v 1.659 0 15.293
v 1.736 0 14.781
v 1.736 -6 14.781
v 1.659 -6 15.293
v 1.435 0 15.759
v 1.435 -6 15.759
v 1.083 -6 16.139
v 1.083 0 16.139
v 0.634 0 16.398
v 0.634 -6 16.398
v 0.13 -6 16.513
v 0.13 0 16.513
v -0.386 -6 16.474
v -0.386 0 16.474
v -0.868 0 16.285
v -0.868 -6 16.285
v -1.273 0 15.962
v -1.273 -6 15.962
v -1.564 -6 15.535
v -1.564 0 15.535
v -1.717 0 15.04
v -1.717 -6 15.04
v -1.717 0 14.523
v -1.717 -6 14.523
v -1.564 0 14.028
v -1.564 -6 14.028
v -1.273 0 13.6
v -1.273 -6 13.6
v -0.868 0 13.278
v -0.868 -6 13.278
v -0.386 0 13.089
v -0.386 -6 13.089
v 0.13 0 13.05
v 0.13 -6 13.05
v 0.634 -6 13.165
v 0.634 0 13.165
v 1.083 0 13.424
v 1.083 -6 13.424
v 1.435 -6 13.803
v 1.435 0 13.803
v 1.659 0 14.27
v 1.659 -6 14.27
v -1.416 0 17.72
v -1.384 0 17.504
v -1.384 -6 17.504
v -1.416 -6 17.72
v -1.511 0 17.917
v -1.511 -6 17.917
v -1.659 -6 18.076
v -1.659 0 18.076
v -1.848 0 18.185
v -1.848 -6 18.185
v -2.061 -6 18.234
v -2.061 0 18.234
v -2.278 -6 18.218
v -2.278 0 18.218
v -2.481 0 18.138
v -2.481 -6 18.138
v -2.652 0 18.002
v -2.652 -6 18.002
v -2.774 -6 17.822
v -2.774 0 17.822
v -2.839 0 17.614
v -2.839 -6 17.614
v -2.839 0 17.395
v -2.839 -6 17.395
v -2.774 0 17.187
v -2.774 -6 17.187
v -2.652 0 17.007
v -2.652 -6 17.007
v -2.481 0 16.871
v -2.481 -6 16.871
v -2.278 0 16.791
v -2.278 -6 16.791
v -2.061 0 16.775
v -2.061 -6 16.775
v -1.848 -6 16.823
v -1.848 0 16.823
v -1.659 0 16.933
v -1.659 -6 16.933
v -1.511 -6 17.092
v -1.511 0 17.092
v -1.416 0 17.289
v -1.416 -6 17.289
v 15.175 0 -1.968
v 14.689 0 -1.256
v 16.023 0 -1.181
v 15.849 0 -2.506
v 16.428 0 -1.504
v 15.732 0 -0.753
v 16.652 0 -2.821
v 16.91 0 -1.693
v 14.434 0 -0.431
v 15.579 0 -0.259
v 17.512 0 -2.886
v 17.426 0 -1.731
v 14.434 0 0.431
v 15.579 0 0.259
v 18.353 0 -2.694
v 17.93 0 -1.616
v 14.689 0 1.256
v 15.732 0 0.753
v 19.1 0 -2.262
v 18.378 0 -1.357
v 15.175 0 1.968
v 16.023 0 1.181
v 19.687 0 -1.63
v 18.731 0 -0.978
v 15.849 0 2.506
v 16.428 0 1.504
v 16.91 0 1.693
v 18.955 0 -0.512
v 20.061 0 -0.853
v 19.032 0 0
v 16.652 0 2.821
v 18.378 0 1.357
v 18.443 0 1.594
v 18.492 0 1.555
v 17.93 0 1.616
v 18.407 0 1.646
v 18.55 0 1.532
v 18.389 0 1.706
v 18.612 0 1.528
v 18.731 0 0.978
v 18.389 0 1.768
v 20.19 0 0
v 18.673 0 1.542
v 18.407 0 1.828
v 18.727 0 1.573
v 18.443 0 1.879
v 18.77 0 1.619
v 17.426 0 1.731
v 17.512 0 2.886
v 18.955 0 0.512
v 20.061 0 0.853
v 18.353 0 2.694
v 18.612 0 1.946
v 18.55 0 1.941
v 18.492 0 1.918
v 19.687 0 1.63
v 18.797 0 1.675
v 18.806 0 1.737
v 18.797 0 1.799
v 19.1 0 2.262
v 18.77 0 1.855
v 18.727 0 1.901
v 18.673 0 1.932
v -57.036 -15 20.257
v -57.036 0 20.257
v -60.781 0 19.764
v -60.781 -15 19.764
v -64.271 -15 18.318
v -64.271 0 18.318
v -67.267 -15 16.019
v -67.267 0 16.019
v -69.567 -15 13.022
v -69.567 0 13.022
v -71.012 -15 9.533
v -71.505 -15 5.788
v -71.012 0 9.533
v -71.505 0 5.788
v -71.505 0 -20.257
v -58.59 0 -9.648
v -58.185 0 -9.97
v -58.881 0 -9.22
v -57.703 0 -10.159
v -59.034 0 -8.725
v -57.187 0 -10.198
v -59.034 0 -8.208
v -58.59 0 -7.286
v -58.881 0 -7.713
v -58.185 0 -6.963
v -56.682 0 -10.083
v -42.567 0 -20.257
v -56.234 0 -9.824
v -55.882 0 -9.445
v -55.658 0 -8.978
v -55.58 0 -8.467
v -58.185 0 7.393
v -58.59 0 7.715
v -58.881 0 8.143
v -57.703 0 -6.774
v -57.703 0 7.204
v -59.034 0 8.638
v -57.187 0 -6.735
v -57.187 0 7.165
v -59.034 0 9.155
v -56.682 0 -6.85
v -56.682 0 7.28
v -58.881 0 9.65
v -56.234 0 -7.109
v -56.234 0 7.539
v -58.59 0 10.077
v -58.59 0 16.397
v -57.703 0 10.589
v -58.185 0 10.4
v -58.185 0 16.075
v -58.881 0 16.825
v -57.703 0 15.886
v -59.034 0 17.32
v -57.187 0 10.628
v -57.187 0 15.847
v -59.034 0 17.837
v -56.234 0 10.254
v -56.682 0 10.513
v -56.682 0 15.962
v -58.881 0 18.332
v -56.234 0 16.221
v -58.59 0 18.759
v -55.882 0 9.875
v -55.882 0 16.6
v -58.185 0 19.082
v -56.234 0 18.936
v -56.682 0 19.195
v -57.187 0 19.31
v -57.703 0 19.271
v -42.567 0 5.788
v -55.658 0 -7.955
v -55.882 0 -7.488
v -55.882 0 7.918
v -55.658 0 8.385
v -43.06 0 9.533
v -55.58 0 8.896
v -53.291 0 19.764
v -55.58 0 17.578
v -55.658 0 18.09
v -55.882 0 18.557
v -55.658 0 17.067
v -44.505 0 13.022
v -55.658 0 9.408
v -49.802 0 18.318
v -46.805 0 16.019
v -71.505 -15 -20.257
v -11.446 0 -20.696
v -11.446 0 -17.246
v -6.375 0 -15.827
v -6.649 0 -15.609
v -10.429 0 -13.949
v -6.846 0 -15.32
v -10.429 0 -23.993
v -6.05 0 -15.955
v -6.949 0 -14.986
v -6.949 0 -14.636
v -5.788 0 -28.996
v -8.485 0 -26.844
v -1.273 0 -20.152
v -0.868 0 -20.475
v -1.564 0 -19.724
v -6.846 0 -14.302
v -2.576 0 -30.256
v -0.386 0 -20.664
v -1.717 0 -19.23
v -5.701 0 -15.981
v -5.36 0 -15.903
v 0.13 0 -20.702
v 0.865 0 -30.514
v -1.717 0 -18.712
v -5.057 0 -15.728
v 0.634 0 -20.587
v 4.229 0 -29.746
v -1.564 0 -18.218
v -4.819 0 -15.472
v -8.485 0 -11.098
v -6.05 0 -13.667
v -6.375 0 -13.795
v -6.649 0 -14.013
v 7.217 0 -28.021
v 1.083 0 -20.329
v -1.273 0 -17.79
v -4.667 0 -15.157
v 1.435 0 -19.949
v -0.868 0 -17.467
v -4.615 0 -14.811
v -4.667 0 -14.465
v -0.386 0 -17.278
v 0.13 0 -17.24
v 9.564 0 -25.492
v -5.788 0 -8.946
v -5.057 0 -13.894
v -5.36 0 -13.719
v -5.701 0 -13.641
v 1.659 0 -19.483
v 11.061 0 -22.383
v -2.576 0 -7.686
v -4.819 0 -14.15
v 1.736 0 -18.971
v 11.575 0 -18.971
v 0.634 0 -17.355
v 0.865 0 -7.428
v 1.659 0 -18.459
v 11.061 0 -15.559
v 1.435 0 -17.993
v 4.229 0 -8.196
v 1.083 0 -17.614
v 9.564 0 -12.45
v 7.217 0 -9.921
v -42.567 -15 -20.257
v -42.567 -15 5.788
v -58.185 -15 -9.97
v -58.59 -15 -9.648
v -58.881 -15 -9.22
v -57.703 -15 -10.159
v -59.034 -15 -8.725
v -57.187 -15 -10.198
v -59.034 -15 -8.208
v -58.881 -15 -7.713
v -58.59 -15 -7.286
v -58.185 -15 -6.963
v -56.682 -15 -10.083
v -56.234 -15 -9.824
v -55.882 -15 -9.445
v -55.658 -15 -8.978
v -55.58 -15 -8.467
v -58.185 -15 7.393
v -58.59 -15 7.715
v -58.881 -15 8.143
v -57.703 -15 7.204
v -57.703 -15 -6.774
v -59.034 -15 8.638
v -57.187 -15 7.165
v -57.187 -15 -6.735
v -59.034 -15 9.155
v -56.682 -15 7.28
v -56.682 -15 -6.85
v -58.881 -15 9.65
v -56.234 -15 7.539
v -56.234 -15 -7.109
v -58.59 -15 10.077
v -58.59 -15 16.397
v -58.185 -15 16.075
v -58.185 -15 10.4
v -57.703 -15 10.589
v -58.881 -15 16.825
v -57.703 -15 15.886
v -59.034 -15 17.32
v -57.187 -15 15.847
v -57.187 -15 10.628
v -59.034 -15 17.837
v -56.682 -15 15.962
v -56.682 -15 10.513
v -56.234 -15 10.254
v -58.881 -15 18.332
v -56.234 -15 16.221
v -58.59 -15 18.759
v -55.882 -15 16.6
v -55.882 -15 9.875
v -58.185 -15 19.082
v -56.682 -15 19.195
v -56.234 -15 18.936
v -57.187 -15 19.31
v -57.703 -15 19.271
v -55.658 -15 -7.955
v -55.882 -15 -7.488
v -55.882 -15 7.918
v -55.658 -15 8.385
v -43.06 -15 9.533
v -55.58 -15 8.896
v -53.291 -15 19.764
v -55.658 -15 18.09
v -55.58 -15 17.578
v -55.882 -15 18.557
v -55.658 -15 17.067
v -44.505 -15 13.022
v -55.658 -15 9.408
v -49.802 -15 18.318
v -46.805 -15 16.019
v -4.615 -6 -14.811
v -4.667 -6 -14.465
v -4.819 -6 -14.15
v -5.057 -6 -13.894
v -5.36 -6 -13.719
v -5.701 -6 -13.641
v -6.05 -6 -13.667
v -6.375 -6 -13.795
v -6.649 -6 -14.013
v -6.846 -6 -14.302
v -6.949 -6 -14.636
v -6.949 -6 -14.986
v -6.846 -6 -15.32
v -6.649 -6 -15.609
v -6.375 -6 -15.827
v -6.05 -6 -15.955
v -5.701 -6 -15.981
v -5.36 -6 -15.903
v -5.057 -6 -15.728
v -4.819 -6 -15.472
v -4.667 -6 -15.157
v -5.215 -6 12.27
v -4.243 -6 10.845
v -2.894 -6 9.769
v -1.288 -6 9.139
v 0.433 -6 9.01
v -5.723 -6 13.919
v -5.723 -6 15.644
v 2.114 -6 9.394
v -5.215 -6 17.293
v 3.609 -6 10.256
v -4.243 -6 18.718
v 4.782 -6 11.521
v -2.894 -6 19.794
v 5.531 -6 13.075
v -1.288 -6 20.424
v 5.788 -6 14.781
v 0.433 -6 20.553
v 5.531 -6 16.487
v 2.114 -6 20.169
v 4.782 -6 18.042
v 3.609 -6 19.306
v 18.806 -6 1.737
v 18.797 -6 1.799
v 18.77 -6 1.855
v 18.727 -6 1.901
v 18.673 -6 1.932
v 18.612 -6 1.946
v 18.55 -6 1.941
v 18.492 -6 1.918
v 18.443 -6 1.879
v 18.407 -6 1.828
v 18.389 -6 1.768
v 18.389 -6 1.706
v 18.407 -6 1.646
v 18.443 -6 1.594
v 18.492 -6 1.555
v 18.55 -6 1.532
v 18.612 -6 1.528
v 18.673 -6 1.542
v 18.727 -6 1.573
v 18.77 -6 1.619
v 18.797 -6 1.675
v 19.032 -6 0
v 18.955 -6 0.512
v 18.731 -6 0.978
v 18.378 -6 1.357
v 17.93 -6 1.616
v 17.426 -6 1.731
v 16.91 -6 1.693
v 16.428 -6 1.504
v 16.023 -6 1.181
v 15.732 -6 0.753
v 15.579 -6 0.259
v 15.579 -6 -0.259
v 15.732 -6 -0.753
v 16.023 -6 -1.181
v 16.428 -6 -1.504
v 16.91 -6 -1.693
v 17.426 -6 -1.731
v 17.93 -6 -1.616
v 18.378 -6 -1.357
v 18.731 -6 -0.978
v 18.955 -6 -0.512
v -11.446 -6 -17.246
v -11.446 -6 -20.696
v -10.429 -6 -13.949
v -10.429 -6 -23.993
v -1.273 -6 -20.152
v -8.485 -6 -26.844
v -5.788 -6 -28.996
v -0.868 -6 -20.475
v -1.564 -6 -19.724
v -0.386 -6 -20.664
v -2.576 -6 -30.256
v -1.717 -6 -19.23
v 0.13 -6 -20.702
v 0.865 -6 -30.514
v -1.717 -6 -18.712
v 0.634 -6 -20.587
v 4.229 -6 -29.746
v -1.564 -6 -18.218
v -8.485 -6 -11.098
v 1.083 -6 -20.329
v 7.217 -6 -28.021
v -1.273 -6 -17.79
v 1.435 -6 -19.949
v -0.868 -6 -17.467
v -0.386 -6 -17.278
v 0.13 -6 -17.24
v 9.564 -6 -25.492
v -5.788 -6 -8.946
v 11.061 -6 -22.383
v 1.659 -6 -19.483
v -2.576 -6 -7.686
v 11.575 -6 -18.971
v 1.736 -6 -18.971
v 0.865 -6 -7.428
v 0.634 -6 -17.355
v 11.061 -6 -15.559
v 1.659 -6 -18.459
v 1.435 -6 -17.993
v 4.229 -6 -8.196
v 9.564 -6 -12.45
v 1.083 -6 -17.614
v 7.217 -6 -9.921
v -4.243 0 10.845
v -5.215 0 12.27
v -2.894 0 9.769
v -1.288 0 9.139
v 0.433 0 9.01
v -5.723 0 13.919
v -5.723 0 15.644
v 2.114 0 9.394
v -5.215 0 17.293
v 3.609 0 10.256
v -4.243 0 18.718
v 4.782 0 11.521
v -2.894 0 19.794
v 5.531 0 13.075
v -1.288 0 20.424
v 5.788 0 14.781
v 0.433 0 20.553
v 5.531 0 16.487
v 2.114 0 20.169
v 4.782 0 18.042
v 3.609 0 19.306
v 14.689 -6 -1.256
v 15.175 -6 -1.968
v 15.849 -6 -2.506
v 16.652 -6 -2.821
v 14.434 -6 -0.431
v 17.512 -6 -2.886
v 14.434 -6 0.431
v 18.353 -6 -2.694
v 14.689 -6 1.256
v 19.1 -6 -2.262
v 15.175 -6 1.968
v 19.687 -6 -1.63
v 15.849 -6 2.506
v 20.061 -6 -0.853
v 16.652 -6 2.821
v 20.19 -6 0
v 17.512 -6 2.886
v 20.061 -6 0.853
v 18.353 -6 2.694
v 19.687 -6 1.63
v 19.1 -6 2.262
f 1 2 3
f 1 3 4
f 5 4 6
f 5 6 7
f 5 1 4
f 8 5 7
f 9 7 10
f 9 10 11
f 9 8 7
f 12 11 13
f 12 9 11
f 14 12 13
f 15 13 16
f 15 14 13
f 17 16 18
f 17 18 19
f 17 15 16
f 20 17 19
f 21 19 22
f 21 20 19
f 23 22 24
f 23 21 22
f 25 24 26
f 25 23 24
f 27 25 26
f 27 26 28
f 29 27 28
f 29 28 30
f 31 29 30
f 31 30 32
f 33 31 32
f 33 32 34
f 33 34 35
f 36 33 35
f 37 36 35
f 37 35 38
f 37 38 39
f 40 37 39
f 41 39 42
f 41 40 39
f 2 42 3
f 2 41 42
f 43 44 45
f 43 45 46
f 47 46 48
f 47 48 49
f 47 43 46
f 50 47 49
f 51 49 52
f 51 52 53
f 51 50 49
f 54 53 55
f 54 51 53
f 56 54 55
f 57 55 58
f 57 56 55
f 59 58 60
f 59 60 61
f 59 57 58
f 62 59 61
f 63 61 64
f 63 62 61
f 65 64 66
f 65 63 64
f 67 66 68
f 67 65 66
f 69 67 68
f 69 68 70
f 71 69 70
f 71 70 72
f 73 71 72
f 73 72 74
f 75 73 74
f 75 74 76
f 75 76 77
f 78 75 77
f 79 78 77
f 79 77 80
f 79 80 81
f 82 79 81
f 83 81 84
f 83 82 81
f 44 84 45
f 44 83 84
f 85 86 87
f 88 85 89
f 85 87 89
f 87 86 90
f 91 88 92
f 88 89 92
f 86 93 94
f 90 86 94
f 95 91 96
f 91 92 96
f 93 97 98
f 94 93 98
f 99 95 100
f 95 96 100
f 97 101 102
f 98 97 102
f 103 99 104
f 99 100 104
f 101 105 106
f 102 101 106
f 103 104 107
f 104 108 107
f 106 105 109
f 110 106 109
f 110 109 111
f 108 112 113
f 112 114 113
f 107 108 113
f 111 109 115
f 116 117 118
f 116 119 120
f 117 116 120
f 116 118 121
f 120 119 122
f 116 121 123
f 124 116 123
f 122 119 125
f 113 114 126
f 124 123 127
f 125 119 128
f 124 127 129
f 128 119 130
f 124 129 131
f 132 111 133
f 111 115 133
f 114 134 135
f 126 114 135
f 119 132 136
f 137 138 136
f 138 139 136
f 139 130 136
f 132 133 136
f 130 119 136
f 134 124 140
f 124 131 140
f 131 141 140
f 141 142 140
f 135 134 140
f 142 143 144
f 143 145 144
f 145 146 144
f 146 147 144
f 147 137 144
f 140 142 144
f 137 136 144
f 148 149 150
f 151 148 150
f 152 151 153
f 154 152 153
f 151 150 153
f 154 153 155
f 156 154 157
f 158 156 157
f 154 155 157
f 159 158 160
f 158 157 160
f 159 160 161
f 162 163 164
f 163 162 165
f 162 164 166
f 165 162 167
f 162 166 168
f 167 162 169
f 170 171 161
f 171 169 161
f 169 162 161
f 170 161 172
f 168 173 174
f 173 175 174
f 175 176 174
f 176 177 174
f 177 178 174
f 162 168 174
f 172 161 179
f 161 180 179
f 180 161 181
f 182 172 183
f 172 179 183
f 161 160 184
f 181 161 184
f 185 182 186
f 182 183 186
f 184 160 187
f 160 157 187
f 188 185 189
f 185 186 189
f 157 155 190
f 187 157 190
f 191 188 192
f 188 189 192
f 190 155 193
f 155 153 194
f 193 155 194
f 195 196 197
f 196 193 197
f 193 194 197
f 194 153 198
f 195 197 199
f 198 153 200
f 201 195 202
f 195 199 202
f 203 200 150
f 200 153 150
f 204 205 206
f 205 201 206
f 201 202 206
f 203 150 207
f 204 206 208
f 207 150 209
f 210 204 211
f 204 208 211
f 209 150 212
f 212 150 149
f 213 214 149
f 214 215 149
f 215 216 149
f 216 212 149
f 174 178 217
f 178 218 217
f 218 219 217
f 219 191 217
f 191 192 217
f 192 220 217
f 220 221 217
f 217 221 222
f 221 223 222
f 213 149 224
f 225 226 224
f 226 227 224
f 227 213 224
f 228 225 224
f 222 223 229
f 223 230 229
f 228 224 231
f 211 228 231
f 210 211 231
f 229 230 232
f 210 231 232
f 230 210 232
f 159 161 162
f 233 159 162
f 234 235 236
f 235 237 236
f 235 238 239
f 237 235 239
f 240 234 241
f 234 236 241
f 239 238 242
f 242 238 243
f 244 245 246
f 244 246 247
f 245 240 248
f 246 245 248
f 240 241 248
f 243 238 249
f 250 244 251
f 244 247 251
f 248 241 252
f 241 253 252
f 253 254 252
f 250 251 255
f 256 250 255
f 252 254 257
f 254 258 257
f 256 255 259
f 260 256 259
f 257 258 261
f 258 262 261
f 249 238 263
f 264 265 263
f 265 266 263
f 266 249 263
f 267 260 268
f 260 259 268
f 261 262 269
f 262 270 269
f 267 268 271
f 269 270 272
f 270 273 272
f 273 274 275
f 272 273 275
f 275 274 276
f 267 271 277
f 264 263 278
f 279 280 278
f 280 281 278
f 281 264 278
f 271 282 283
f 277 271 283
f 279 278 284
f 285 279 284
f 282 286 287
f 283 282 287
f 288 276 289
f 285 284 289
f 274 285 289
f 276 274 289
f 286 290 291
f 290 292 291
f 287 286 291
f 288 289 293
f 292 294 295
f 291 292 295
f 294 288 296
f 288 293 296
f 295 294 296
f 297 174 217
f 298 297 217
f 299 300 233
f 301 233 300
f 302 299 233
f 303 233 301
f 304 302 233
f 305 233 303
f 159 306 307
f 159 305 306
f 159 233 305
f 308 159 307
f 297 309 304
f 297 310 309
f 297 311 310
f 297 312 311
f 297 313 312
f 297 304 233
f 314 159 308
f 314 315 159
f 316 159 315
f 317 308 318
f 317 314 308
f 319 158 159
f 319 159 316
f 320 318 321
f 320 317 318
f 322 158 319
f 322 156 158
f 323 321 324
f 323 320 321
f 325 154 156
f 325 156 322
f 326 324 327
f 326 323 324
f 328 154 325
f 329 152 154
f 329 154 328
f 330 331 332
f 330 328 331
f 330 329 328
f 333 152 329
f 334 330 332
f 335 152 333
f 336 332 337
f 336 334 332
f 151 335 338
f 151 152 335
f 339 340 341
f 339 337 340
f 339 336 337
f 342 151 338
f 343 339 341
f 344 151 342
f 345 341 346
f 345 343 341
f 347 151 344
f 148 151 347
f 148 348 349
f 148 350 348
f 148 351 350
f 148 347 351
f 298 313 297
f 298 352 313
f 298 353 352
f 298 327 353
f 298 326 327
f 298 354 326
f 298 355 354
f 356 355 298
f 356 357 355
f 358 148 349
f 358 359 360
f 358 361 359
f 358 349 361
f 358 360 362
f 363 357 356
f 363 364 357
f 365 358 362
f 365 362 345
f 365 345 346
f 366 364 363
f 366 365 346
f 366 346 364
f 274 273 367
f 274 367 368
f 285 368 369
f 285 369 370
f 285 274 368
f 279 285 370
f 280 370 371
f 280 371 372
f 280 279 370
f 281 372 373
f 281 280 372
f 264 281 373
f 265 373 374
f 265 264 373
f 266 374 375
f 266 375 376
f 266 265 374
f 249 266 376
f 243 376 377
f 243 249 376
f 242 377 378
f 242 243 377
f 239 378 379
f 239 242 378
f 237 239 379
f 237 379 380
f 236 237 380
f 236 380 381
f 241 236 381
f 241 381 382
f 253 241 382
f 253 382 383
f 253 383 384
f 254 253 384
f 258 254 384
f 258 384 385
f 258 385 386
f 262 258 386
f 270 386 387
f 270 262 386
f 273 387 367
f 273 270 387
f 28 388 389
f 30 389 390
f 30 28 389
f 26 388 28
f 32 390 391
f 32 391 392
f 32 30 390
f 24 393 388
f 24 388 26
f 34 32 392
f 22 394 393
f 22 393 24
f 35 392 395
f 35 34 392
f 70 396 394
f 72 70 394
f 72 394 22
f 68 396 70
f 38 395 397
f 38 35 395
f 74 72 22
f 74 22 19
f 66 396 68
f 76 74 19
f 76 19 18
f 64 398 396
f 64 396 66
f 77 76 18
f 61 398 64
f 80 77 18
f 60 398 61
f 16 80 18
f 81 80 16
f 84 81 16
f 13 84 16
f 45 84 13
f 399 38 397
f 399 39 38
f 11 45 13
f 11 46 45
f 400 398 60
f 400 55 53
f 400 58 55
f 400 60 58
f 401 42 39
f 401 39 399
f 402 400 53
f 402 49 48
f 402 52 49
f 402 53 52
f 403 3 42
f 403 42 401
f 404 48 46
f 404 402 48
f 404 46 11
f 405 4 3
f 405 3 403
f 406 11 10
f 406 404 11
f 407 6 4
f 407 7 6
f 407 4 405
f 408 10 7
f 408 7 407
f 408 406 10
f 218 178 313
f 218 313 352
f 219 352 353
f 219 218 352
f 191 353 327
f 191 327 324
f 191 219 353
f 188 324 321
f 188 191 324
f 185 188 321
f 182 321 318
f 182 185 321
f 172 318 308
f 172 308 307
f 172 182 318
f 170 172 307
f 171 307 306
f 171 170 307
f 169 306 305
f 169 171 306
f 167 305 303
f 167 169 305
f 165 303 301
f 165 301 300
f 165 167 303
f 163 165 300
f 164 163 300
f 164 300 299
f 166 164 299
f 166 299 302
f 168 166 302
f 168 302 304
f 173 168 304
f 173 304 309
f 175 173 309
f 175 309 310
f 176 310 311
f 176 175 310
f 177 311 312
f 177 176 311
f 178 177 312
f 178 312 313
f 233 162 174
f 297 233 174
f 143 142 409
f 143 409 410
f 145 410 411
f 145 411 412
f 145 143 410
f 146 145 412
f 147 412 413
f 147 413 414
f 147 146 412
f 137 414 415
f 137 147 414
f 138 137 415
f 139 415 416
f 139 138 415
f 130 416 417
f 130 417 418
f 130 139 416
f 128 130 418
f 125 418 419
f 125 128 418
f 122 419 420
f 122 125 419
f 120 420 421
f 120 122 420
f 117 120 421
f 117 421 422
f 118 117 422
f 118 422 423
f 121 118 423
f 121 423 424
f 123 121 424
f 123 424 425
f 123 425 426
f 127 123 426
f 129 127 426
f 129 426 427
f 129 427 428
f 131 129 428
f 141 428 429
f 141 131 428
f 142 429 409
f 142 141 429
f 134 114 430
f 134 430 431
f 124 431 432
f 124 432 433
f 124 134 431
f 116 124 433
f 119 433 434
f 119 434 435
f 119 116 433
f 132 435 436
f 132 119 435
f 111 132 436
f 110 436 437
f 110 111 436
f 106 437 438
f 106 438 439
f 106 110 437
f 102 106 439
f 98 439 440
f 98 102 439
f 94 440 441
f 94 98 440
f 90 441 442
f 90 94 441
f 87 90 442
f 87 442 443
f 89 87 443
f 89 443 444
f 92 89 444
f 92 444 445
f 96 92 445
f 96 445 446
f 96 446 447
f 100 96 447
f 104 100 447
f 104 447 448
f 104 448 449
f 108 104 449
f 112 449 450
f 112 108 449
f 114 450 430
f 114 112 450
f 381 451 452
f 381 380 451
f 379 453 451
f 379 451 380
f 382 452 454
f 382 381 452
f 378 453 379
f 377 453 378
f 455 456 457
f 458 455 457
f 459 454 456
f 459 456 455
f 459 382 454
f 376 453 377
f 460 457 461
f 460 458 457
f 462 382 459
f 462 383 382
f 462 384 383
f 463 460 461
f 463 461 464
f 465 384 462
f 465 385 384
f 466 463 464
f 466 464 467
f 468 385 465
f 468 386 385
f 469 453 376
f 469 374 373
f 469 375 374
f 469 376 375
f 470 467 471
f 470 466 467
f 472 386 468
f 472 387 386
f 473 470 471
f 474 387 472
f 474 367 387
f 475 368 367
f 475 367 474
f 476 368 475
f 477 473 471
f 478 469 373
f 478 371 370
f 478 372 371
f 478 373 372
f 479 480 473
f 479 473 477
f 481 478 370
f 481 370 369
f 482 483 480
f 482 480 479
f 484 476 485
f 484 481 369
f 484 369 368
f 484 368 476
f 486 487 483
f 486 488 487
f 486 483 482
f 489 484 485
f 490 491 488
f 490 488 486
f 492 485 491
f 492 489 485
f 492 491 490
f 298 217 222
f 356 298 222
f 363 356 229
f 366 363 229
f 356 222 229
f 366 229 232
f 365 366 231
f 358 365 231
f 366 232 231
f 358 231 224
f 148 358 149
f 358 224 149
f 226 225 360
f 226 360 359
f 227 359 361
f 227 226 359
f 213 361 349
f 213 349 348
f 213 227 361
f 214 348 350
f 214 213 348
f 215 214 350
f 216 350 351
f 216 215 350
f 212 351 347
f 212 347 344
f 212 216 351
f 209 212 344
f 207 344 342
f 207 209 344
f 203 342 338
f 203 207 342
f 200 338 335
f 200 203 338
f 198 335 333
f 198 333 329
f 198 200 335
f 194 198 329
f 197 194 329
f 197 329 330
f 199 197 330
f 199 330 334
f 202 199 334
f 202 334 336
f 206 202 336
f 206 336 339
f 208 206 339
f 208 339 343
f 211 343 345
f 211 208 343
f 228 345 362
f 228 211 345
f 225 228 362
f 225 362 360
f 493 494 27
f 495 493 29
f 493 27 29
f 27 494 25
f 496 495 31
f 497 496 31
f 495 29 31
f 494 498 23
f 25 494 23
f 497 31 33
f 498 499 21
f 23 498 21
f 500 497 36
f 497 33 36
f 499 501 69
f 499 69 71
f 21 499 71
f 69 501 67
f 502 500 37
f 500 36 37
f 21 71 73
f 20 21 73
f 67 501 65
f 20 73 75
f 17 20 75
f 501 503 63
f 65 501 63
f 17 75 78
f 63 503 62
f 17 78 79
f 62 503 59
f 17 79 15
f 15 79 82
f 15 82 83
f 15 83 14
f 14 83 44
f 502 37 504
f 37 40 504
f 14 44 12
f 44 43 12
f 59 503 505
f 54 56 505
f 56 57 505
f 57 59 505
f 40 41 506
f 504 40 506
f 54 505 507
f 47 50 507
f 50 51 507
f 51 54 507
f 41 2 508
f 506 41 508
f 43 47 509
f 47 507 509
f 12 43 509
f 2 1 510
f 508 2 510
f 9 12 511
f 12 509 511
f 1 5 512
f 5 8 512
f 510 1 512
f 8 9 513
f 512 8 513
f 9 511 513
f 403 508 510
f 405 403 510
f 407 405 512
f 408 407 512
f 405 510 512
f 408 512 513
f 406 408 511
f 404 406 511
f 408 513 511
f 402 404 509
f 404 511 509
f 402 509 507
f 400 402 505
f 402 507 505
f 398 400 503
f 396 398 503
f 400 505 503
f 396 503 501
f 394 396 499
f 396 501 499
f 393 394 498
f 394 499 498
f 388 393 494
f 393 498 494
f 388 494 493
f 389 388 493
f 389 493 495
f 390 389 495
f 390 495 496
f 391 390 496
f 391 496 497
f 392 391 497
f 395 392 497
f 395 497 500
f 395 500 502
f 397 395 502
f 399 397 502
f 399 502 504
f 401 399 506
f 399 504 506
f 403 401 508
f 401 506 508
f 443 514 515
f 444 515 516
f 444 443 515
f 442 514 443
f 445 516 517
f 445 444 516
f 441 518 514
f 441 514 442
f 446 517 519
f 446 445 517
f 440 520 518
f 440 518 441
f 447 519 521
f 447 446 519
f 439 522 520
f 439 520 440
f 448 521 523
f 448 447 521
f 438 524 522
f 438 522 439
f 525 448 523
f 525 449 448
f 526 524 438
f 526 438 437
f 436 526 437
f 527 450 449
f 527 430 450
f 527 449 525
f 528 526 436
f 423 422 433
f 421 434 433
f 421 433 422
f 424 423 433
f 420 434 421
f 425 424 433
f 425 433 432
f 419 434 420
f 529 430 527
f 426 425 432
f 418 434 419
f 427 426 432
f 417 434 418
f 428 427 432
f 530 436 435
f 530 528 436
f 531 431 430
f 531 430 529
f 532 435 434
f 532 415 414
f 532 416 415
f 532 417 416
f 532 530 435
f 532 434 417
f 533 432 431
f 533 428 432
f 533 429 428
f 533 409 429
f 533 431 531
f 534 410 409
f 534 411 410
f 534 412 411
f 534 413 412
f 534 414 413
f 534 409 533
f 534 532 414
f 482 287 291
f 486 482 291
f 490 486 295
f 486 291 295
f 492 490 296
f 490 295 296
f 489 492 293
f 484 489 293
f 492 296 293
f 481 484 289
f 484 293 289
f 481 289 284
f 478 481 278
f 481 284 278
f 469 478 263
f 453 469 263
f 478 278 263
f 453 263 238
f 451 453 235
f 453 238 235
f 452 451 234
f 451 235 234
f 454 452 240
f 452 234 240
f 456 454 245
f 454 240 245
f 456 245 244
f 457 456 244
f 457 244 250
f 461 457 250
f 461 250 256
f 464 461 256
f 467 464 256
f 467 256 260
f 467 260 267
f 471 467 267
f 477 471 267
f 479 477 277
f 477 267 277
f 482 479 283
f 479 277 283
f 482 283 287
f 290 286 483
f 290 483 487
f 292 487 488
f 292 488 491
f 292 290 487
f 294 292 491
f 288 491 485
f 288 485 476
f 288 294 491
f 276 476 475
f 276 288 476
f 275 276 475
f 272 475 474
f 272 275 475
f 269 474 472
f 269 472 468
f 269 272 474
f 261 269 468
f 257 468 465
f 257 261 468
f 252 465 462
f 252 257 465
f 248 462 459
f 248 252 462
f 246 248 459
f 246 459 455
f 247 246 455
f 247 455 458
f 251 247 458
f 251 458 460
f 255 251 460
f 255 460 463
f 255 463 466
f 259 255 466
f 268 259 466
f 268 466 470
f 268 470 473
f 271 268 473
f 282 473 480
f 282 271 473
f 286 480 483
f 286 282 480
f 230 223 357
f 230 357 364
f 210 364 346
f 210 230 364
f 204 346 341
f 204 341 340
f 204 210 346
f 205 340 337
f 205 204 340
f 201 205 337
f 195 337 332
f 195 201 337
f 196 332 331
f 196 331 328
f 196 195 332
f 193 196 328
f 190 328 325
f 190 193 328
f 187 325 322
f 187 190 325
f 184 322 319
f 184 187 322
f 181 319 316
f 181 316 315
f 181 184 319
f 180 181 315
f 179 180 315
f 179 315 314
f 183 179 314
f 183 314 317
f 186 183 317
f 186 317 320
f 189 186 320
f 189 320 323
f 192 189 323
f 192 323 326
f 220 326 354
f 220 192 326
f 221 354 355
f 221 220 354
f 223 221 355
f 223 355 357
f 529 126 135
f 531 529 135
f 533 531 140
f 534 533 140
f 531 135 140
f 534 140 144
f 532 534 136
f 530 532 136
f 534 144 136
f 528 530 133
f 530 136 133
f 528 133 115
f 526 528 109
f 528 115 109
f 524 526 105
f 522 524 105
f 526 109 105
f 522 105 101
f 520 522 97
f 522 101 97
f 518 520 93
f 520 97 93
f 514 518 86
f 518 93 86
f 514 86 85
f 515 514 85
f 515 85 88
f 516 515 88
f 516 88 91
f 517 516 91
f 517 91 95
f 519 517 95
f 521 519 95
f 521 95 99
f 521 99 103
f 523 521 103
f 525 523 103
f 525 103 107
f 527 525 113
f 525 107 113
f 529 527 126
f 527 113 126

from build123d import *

# Parameters (mm, degrees)
F0_R     = 1.736305
F1_DEPTH = 15
F0_R_2   = 5.787677
F0_R_3   = 1.736303
F0_R_4   = 0.731572
F2_DEPTH = 6
F0_R_5   = 11.575355
F0_R_6   = 1.173323
F3_DEPTH = 6
F0_R_7   = 2.893839
F0_R_8   = 0.209683
F4_DEPTH = 6


with BuildPart() as f1:
    # F0 (on Front) → F1 (new body)
    with BuildSketch(Plane.XZ):
        with BuildLine():
            Line((-71.505299, -20.25687), (-42.566913, -20.25687))
            Line((-42.566913, -20.25687), (-42.566913, 5.787677))
            ThreePointArc((-42.566913, 5.787677), (-46.804841, 16.018942), (-57.036106, 20.25687))
            ThreePointArc((-57.036106, 20.25687), (-67.267371, 16.018942), (-71.505299, 5.787677))
            Line((-71.505299, 5.787677), (-71.505299, -20.25687))
        make_face()
        with Locations((-57.316788, -8.466583)):
            Circle(F0_R, mode=Mode.SUBTRACT)
        with Locations((-57.316788, 8.896417)):
            Circle(F0_R, mode=Mode.SUBTRACT)
        with Locations((-57.316788, 17.578417)):
            Circle(F0_R, mode=Mode.SUBTRACT)
    extrude(amount=F1_DEPTH)


with BuildPart() as f2:
    # F0 (on Front) → F2 (new body)
    with BuildSketch(Plane.XZ):
        with Locations((0, 14.781383)):
            Circle(F0_R_2)
        with Locations((0, 14.781383)):
            Circle(F0_R_3, mode=Mode.SUBTRACT)
        with Locations((-2.115286, 17.504476)):
            Circle(F0_R_4, mode=Mode.SUBTRACT)
    extrude(amount=F2_DEPTH)


with BuildPart() as f3:
    # F0 (on Front) → F3 (new body)
    with BuildSketch(Plane.XZ):
        with Locations((0, -18.971049)):
            Circle(F0_R_5)
        with Locations((0, -18.971049)):
            Circle(F0_R_3, mode=Mode.SUBTRACT)
        with Locations((-5.788575, -14.810966)):
            Circle(F0_R_6, mode=Mode.SUBTRACT)
    extrude(amount=F3_DEPTH)


with BuildPart() as f4:
    # F0 (on Front) → F4 (new body)
    with BuildSketch(Plane.XZ):
        with Locations((17.295926, 0)):
            Circle(F0_R_7)
        with Locations((17.295926, 0)):
            Circle(F0_R_3, mode=Mode.SUBTRACT)
        with Locations((18.596414, 1.736823)):
            Circle(F0_R_8, mode=Mode.SUBTRACT)
    extrude(amount=F4_DEPTH)


solid = Compound([f1.part, f2.part, f3.part, f4.part])
